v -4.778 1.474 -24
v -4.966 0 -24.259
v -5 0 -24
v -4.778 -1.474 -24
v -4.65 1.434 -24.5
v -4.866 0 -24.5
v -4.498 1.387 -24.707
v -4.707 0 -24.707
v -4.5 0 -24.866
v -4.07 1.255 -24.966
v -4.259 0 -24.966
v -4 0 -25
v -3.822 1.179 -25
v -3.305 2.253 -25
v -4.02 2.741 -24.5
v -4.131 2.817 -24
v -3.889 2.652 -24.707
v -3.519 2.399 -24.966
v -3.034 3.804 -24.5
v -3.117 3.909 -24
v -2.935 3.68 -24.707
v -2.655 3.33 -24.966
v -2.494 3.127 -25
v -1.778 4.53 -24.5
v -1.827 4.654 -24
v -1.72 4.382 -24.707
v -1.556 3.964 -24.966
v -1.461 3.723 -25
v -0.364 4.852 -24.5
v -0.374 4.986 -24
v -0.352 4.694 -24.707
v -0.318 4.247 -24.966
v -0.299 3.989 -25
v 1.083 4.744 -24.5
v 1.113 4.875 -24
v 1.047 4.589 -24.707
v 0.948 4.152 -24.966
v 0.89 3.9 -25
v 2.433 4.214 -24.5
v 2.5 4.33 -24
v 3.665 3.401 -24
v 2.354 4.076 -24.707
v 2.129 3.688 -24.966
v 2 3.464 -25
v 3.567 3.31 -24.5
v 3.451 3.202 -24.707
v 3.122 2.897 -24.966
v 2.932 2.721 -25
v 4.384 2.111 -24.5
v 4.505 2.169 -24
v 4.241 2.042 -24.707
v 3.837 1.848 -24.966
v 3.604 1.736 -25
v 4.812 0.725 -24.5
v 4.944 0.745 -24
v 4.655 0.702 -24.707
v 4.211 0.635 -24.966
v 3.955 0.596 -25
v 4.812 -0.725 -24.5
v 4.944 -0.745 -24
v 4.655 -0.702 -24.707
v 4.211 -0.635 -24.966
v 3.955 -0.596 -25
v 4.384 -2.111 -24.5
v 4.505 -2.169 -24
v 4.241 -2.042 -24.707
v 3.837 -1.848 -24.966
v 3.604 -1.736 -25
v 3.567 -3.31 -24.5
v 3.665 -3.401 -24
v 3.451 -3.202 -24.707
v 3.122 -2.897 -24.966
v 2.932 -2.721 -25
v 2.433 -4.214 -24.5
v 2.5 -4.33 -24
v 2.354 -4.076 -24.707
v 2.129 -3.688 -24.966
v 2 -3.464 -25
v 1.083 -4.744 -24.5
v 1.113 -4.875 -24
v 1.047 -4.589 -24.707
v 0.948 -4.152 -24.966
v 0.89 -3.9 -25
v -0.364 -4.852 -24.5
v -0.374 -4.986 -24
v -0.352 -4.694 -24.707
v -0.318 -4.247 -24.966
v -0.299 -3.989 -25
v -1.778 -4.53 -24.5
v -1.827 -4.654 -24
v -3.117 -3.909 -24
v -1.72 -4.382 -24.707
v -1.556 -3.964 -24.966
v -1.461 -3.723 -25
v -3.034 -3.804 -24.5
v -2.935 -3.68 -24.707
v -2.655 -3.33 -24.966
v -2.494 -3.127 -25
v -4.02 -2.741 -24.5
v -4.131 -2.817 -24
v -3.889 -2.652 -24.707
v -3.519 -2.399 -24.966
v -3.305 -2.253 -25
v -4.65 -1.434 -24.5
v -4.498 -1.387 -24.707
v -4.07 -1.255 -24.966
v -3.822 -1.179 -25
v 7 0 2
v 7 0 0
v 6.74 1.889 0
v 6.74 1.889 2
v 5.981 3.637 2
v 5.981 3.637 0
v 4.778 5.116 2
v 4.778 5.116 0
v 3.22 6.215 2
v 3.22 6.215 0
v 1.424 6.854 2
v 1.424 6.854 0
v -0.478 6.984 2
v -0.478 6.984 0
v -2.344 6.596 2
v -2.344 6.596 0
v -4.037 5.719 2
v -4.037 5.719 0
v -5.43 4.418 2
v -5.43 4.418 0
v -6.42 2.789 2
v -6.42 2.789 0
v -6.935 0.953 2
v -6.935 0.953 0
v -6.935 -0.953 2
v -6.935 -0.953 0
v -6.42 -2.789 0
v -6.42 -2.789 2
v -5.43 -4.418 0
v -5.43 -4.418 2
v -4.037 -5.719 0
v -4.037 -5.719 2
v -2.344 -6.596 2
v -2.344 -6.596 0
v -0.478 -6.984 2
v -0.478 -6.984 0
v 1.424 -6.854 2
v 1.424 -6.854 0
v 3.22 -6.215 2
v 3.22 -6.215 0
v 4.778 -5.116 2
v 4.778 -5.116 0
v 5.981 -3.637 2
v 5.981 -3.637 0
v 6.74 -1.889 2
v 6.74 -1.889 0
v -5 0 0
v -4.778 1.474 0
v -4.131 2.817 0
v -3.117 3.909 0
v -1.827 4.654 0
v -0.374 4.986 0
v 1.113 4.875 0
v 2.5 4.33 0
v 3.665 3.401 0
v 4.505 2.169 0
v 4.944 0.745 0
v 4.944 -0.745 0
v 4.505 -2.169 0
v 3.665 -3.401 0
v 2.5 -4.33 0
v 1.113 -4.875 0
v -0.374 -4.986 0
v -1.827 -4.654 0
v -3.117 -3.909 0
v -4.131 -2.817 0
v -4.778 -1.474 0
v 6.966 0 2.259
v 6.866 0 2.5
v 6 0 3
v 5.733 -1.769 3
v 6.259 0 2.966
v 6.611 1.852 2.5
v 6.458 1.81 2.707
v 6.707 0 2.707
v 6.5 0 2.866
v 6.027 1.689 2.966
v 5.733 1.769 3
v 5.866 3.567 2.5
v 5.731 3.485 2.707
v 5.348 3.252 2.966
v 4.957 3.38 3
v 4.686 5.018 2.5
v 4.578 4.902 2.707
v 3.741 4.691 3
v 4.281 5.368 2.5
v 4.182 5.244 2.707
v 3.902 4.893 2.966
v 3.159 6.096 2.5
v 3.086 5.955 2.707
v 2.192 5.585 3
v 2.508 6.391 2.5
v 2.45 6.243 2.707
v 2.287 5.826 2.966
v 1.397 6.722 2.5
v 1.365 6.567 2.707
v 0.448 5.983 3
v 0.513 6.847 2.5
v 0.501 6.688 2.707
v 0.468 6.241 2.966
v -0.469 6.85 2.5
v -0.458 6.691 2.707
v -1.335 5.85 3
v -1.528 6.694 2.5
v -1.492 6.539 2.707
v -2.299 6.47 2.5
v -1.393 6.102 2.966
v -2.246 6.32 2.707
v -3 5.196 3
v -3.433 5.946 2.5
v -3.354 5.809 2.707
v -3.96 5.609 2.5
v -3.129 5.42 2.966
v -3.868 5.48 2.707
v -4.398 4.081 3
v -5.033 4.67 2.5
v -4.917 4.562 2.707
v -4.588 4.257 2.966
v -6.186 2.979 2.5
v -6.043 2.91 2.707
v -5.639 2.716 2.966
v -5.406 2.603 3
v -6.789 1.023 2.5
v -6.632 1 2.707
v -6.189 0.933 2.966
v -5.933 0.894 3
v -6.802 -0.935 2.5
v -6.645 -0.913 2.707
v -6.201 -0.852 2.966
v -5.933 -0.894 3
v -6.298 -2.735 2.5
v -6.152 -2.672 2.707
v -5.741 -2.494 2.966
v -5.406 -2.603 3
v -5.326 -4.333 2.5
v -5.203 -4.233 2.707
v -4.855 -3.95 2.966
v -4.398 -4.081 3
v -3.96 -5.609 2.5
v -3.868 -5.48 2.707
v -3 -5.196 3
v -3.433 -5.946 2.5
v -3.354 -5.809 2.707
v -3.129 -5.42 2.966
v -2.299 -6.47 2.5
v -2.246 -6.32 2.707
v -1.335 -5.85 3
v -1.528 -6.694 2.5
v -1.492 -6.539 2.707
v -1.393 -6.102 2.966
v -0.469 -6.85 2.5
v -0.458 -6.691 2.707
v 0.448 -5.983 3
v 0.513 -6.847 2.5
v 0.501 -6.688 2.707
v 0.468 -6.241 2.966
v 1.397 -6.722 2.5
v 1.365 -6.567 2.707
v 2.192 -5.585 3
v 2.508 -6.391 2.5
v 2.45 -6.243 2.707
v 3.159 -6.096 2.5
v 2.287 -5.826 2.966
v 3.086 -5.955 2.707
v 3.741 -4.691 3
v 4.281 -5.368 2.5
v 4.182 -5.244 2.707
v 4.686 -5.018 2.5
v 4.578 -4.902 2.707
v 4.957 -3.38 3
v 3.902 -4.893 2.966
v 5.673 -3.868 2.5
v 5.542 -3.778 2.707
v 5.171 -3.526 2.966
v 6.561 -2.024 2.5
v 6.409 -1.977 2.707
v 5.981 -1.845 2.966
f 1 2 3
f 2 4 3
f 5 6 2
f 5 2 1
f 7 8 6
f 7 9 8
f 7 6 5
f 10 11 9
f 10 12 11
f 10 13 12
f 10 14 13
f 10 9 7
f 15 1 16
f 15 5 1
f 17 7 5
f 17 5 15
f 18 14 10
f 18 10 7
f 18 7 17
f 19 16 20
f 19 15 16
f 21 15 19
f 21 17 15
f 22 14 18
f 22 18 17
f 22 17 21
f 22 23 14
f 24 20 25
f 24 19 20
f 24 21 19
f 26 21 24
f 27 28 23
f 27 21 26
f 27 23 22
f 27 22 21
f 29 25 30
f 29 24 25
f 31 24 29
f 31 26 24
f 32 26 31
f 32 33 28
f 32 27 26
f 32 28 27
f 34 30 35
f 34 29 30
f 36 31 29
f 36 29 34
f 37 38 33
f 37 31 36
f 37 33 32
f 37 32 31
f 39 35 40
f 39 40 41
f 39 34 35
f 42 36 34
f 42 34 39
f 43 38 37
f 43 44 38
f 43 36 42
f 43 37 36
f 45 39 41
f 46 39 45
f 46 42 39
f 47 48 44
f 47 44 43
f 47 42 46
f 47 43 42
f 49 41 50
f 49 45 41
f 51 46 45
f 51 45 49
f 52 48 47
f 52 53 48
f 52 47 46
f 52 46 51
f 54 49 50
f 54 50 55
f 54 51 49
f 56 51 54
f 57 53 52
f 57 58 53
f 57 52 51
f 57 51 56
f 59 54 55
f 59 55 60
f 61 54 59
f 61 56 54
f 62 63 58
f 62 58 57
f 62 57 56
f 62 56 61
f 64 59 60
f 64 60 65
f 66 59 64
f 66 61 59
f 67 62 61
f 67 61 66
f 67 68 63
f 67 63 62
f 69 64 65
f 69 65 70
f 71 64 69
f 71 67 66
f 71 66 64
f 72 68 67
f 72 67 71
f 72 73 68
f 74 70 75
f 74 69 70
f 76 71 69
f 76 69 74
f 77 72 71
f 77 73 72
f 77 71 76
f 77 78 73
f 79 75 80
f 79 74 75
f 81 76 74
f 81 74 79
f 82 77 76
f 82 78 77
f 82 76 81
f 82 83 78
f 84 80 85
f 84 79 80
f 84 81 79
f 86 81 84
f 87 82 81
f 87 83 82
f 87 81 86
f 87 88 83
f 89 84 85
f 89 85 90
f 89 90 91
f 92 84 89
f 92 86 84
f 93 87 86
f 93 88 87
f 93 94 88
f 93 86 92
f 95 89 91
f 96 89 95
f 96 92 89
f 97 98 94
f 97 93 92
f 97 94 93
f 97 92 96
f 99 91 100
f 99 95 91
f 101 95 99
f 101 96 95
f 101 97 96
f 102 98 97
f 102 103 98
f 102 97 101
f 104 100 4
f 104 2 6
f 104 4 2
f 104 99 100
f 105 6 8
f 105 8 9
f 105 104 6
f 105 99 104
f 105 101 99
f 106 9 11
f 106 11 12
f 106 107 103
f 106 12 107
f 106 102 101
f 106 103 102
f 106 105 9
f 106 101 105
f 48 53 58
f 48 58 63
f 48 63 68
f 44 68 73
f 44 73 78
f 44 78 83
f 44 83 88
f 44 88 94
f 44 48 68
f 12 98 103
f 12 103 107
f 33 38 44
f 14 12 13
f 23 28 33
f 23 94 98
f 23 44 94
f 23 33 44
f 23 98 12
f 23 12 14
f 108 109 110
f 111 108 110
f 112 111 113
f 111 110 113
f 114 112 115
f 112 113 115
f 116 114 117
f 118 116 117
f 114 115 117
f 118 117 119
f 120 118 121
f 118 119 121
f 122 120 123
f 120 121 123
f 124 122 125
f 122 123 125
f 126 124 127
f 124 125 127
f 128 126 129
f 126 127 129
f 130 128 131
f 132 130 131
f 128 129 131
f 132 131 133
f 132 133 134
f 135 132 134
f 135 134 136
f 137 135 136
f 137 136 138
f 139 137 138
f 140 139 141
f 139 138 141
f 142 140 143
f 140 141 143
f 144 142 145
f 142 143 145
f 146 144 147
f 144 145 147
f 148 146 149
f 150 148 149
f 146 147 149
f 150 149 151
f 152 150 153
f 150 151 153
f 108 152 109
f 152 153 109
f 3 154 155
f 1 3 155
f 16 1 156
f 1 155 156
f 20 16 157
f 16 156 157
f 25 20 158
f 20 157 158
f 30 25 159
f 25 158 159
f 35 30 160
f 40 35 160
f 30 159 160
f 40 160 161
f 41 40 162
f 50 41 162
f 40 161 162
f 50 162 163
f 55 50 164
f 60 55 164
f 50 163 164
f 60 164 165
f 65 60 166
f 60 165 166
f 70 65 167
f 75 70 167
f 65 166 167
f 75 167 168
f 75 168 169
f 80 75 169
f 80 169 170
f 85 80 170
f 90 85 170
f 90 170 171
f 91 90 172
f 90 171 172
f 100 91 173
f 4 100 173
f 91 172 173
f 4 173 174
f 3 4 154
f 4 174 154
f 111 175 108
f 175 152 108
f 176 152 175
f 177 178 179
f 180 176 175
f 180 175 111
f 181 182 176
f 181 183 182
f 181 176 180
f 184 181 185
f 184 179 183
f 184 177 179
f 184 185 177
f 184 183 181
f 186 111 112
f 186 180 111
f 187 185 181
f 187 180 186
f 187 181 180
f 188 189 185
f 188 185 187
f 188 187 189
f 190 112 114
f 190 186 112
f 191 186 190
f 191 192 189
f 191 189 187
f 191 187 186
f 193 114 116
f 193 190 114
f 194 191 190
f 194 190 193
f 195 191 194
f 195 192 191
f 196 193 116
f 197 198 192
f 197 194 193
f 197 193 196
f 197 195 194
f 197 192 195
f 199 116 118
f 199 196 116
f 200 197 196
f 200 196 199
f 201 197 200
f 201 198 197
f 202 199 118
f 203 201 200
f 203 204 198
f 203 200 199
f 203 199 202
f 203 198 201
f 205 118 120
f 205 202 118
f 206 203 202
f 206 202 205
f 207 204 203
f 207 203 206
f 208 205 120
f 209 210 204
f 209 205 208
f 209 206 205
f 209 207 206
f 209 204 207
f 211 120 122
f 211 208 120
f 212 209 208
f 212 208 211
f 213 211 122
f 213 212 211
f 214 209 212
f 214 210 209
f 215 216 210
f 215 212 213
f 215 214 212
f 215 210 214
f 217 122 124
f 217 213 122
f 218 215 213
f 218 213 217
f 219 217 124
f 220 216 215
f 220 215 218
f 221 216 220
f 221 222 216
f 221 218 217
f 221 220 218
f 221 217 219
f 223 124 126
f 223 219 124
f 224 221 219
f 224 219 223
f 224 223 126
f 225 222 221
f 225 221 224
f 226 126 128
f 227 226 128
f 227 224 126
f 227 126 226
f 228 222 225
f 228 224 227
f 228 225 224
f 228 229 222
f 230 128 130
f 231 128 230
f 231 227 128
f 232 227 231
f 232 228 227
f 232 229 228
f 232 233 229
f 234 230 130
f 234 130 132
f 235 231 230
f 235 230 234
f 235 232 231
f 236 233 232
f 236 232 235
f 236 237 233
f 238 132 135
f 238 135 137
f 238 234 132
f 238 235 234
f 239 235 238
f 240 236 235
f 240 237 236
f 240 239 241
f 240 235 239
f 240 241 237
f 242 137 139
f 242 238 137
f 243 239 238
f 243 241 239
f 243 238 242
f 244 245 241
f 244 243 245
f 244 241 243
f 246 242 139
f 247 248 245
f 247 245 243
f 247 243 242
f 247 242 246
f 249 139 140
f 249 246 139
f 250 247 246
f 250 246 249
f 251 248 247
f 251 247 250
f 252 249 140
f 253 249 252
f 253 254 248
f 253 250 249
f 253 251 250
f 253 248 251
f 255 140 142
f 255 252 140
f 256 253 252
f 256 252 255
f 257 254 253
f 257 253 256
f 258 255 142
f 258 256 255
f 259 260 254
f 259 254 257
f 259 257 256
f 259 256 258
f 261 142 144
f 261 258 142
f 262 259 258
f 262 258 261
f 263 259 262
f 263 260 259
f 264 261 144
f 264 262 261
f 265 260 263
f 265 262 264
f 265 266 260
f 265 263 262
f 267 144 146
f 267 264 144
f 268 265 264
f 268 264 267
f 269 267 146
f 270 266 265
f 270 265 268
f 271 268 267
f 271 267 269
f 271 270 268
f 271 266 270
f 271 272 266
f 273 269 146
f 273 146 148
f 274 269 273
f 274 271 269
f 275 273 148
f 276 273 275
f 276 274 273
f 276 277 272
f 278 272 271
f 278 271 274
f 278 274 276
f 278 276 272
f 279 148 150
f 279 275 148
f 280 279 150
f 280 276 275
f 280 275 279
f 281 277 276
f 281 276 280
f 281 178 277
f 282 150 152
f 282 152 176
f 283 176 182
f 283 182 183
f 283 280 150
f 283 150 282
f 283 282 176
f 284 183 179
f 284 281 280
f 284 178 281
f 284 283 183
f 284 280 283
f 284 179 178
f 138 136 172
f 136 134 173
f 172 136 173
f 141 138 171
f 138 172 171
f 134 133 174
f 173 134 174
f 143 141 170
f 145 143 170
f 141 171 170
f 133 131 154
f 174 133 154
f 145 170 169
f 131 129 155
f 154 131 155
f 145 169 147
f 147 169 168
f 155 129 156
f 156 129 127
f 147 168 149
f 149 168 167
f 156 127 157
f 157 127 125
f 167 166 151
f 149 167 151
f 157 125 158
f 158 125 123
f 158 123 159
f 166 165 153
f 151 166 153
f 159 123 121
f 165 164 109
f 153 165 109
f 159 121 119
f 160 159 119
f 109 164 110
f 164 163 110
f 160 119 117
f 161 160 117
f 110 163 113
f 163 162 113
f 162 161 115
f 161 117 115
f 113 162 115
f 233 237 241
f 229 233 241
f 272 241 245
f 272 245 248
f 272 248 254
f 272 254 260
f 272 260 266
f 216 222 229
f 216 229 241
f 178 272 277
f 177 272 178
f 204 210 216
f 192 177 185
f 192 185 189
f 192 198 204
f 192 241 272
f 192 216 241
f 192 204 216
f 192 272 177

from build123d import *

# Parameters (mm, degrees)
SKICA1_R                = 7
P_IDAT_VYSUNUT_M1_DEPTH = 3
SKICA2_R                = 5
P_IDAT_VYSUNUT_M2_DEPTH = 25
ZAOBLIT1_R              = 1


with BuildPart() as part:
    # Skica1 → Přidat vysunutím1 (new body)
    with BuildSketch(Plane.XY):
        Circle(SKICA1_R)
    extrude(amount=P_IDAT_VYSUNUT_M1_DEPTH)

    # Skica2 → Přidat vysunutím2 (add)
    with BuildSketch(Plane(origin=(0, 0, 0), x_dir=(-1, 0, 0), z_dir=(0, 0, -1))):
        Circle(SKICA2_R)
    extrude(amount=P_IDAT_VYSUNUT_M2_DEPTH)

    # Zaoblit1
    zaoblit1_edges = [part.edges().sort_by_distance(p)[0] for p in [
        (-7, 0, 3),
        (5, 0, -25),
    ]]
    fillet(zaoblit1_edges, radius=ZAOBLIT1_R)


solid = part.part
